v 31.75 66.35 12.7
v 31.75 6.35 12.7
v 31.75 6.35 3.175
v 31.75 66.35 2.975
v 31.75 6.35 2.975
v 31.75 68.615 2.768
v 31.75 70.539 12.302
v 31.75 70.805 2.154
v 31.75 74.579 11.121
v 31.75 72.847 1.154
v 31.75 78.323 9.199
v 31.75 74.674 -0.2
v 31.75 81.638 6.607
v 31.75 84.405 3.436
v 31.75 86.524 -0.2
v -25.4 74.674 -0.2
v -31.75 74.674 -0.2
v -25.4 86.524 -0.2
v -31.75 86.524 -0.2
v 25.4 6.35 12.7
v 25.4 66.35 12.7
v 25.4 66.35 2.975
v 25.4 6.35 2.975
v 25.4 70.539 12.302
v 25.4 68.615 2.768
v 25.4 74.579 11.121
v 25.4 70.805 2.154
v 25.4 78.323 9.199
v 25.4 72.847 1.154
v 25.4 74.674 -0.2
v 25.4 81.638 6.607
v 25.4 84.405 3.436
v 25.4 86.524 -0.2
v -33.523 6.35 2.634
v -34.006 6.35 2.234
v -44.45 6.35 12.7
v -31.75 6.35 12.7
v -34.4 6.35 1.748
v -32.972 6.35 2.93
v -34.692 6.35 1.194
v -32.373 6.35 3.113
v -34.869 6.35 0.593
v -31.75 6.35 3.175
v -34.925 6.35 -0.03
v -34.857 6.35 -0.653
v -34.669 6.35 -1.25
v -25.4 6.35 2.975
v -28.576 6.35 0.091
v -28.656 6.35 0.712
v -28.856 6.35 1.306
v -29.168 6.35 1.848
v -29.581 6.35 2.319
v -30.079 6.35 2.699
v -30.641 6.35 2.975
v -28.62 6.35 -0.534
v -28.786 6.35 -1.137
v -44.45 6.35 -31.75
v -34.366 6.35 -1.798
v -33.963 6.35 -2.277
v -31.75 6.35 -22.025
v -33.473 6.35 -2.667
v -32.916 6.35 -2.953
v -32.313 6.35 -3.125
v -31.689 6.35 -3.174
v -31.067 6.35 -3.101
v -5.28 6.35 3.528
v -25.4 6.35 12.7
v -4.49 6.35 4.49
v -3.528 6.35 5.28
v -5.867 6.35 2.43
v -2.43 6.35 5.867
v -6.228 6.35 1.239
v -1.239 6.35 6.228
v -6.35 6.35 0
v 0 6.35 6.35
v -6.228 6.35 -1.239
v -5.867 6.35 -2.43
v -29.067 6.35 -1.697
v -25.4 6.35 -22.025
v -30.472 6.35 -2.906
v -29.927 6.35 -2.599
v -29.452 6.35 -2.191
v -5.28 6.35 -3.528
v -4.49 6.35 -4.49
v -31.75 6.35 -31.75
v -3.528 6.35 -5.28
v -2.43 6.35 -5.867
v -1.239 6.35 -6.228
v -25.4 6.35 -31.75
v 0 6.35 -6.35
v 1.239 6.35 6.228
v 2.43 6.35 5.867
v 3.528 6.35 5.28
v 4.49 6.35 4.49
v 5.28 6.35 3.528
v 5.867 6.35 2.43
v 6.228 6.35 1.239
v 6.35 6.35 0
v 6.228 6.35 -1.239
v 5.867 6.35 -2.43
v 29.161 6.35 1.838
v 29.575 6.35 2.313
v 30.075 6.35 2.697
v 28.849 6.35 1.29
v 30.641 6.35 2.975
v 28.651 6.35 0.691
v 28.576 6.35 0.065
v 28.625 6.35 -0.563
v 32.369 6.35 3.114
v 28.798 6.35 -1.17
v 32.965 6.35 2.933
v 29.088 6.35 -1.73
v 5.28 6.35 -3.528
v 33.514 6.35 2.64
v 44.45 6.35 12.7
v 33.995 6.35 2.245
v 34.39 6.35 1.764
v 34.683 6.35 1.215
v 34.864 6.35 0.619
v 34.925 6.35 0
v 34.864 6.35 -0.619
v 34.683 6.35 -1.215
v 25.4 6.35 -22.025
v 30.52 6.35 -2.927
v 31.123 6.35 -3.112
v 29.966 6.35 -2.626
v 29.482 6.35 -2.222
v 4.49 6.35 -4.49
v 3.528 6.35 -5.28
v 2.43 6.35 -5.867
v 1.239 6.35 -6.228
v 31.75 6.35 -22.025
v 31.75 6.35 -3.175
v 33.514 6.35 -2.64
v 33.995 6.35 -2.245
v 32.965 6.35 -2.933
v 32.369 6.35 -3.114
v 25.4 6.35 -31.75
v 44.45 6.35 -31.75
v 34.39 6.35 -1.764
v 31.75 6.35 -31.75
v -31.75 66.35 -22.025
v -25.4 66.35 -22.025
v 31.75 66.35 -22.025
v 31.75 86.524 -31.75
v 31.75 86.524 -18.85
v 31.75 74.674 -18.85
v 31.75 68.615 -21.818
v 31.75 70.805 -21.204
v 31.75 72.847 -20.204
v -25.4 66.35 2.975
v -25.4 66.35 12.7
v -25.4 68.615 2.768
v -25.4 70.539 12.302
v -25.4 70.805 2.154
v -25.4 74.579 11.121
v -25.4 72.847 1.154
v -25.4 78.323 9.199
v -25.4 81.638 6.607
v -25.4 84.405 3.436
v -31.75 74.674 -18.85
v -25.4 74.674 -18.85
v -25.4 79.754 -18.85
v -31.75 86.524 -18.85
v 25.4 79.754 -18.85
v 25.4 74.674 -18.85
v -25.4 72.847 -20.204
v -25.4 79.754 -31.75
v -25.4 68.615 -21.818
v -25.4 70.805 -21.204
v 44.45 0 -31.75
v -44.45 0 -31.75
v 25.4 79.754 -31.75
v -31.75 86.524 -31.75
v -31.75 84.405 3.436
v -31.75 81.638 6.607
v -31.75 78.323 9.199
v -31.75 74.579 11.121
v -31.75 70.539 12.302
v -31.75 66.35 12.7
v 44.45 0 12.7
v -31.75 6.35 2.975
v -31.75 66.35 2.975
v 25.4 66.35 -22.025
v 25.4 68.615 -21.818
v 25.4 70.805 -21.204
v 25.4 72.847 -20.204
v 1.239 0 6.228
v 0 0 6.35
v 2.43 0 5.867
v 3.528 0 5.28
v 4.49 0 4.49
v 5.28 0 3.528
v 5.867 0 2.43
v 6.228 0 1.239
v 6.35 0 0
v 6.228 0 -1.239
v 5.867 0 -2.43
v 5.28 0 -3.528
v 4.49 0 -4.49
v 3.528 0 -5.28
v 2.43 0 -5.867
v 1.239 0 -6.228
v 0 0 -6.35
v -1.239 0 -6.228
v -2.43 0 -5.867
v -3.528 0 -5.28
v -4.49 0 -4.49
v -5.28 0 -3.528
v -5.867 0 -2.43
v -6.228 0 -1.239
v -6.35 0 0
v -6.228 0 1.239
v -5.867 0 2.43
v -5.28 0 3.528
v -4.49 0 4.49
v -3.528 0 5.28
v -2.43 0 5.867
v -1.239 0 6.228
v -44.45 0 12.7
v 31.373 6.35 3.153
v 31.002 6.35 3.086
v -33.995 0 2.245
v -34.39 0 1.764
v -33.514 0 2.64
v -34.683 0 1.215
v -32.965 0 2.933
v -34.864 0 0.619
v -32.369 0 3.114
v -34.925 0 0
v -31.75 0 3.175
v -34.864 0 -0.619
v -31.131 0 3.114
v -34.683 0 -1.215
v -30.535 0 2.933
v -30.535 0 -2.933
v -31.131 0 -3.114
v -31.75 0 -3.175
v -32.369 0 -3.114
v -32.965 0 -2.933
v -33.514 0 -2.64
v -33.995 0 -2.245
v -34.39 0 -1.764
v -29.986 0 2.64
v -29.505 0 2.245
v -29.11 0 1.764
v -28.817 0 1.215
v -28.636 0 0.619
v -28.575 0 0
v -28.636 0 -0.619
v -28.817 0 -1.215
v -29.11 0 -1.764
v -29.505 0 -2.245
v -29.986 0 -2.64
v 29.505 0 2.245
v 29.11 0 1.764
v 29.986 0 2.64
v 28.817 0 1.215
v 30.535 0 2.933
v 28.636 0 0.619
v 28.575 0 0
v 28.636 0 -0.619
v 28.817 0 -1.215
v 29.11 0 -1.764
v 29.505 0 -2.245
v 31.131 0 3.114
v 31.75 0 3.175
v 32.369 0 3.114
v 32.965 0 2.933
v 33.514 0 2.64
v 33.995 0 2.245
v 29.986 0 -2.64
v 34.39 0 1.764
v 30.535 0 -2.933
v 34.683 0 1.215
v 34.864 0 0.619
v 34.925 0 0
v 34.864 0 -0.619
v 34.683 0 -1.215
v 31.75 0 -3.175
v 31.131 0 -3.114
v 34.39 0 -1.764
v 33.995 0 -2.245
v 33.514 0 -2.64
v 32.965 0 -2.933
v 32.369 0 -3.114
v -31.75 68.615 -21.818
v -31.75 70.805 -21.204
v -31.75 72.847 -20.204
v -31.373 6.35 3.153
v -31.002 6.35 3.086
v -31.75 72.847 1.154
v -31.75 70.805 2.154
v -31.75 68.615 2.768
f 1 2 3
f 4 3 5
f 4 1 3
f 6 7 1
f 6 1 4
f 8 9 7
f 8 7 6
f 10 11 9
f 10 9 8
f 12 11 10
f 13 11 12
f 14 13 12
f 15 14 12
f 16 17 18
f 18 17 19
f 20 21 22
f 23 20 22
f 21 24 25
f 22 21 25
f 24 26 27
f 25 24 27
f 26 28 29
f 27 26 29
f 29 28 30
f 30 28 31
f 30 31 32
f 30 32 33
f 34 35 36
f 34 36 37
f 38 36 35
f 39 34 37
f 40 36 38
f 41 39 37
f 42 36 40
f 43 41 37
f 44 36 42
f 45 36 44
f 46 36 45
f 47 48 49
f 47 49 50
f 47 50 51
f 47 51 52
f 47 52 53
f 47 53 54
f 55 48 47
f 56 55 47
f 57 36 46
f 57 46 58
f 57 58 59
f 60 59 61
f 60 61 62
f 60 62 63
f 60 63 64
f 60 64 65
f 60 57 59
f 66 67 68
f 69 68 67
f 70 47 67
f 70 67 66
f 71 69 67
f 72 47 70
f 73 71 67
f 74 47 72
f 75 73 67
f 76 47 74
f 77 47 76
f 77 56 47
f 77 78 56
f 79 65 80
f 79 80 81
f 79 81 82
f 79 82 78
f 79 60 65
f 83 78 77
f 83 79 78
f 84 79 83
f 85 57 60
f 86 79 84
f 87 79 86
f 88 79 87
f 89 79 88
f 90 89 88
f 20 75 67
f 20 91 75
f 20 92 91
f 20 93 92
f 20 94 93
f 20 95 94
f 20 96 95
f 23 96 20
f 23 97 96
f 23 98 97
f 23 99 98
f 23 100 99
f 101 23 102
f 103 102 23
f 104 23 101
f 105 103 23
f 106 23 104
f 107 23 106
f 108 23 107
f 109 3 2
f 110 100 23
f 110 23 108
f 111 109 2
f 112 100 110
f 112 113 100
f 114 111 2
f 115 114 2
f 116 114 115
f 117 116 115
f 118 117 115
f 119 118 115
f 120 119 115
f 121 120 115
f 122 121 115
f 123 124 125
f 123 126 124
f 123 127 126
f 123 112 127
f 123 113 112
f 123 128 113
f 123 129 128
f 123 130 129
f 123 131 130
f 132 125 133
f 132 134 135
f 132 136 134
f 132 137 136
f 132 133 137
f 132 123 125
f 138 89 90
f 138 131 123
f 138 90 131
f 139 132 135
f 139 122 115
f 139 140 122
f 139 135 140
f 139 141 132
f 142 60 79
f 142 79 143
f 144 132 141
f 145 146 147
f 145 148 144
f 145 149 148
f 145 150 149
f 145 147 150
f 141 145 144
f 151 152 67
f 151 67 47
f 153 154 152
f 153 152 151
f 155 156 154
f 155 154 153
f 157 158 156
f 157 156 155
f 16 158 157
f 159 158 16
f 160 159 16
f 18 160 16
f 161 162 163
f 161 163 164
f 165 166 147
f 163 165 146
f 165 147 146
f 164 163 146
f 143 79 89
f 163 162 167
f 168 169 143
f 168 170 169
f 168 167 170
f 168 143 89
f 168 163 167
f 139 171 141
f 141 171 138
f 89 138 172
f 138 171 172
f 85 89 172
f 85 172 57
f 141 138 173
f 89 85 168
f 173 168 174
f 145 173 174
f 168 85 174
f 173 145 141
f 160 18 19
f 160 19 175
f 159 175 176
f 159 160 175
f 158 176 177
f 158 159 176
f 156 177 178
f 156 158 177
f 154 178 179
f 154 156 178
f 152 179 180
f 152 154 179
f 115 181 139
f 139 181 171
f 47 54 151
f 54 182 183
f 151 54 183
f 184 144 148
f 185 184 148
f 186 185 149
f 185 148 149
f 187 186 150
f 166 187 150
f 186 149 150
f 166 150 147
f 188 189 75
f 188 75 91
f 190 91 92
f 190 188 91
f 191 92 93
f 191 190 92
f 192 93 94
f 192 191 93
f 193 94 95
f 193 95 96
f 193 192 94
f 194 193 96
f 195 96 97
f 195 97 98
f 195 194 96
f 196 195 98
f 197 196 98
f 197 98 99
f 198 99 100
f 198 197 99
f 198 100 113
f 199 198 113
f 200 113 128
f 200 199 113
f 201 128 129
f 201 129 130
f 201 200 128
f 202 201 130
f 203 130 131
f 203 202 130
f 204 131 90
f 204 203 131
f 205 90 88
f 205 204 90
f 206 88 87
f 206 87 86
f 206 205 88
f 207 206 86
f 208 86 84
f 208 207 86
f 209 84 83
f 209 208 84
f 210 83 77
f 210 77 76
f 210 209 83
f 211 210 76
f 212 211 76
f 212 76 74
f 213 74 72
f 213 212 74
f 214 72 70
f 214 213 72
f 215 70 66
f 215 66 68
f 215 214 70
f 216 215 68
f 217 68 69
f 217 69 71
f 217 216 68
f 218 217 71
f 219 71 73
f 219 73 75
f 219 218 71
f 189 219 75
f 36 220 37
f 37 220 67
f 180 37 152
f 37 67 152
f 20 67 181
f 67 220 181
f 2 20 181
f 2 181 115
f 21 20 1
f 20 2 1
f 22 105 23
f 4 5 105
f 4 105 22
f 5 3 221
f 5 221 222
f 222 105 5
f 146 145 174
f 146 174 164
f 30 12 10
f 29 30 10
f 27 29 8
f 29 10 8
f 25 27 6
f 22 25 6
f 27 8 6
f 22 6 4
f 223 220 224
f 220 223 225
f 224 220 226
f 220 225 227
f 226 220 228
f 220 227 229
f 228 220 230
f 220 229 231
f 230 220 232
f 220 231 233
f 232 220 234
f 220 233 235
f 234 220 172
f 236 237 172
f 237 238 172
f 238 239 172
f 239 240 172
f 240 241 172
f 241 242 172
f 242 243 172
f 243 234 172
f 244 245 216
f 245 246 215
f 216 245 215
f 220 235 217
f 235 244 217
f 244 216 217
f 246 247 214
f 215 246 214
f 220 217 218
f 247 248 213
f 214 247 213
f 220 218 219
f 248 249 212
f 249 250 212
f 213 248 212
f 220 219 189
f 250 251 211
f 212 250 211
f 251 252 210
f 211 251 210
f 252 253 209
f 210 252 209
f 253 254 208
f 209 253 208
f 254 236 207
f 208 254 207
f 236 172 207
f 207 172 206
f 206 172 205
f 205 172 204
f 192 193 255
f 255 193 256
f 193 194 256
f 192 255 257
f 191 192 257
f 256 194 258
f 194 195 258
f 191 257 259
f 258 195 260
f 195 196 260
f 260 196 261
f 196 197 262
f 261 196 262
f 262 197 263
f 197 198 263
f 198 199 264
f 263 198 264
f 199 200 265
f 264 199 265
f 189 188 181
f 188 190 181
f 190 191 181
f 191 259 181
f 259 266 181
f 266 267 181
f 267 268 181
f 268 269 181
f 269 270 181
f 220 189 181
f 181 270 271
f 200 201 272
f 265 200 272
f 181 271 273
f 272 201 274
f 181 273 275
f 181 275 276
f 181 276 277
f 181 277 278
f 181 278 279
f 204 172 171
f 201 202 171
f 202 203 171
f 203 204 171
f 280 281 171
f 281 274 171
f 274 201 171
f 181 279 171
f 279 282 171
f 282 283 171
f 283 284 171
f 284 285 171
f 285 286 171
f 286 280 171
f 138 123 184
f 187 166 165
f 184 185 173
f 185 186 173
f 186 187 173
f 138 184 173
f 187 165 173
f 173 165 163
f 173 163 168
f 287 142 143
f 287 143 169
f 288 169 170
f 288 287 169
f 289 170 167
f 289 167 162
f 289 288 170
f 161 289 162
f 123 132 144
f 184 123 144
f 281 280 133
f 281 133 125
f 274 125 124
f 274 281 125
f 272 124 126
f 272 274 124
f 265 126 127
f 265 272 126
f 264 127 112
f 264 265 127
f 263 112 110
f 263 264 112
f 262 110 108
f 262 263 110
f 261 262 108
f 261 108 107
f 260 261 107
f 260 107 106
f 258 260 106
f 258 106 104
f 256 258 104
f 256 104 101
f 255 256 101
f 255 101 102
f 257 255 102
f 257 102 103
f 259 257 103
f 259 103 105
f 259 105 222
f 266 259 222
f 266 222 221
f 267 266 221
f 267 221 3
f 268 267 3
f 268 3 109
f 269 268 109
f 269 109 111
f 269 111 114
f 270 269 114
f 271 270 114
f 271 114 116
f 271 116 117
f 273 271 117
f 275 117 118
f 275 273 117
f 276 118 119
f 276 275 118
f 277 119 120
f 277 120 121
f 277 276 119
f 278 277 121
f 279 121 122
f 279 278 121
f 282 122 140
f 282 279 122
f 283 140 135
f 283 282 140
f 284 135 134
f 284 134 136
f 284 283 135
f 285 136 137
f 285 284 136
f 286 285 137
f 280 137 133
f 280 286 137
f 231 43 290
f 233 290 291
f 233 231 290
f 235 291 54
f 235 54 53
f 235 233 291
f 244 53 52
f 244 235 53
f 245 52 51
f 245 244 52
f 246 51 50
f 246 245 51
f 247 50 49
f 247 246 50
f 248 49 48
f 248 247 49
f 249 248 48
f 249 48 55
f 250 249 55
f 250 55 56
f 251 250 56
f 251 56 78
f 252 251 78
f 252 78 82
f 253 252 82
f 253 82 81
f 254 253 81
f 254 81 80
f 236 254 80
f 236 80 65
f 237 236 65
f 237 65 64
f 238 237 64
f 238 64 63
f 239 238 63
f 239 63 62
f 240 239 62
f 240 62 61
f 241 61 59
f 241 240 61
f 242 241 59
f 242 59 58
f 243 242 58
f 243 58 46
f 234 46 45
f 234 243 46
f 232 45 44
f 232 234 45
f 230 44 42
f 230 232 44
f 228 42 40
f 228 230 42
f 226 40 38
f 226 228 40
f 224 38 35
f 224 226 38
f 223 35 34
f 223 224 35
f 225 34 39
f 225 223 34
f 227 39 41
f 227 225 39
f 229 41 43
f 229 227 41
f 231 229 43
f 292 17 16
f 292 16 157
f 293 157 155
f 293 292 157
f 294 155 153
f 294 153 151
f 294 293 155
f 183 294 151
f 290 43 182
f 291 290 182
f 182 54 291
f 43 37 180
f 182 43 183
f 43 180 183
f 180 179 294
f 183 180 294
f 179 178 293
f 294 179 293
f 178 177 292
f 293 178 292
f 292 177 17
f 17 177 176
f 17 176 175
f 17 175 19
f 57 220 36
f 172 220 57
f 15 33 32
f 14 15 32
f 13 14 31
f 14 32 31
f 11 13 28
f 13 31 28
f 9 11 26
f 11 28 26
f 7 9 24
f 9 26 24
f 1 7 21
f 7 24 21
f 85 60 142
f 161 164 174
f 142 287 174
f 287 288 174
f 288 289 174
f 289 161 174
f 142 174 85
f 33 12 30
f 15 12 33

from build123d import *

# Parameters (mm, degrees)
SKETCH2_W           = 88.9
SKETCH2_H           = 44.45
SKETCH2_R           = 6.35
SKETCH2_R_2         = 3.175
BOSS_EXTRUDE1_DEPTH = 6.35
SKETCH3_R           = 22.225
SKETCH3_W           = 44.45
SKETCH3_H           = 60
BOSS_EXTRUDE2_DEPTH = 6.35
CUT_EXTRUDE1_REACH  = 123.079
SKETCH4_R           = 12.5
SKETCH4_W           = 25
SKETCH4_H           = 60
SKETCH4_W_2         = 18.65
SKETCH4_H_2         = 13.900675703
SKETCH5_W           = 9.725
SKETCH5_H           = 8.324324297
BOSS_EXTRUDE3_DEPTH = 6.35
SKETCH6_W           = 12.9
SKETCH6_H           = 6.769792784
BOSS_EXTRUDE4_DEPTH = 57.15


with BuildPart() as part:
    # Sketch2 → Boss-Extrude1 (new body)
    with BuildSketch(Plane(origin=(0, 0, 0), x_dir=(1, 0, 0), z_dir=(0, 1, 0))):
        with Locations((0, 9.525)):
            Rectangle(SKETCH2_W, SKETCH2_H)
        with Locations(Location((0, 0, 0), (0, 0, 270))):
            Circle(SKETCH2_R, mode=Mode.SUBTRACT)
        with Locations(Location((-31.75, 0, 0), (0, 0, 270))):
            Circle(SKETCH2_R_2, mode=Mode.SUBTRACT)
        with Locations(Location((31.75, 0, 0), (0, 0, 90))):
            Circle(SKETCH2_R_2, mode=Mode.SUBTRACT)
    extrude(amount=BOSS_EXTRUDE1_DEPTH)

    # Sketch3 → Boss-Extrude2 (add)
    with BuildSketch(Plane(origin=(25.4, 0, 0), x_dir=(0, 0, -1), z_dir=(1, 0, 0))):
        with Locations((9.525, 66.35)):
            Circle(SKETCH3_R)
        with Locations((9.525, 36.35)):
            Rectangle(SKETCH3_W, SKETCH3_H)
    boss_extrude2 = extrude(amount=BOSS_EXTRUDE2_DEPTH)

    # Cut-Extrude1: up to this face of the body (flat: up to its plane)
    cut_extrude1_end = Plane(part.part.faces().sort_by_distance((25.4, 45.236582144, -9.525))[0])
    # Sketch4 → Cut-Extrude1 (cut, up to the picked face)
    with BuildSketch(Plane(origin=(31.75, 0, 0), x_dir=(0, 0, -1), z_dir=(1, 0, 0)), mode=Mode.PRIVATE) as cut_extrude1_sk1:
        with Locations((9.525, 66.35)):
            Circle(SKETCH4_R)
    cut_extrude1_tool1 = split(extrude(cut_extrude1_sk1.sketch, amount=-CUT_EXTRUDE1_REACH, mode=Mode.PRIVATE), bisect_by=cut_extrude1_end, keep=Keep.BOTH, mode=Mode.PRIVATE)
    # Sketch4 → Cut-Extrude1 (cut, up to the picked face)
    with BuildSketch(Plane(origin=(31.75, 0, 0), x_dir=(0, 0, -1), z_dir=(1, 0, 0)), mode=Mode.PRIVATE) as cut_extrude1_sk2:
        with Locations((9.525, 36.35)):
            Rectangle(SKETCH4_W, SKETCH4_H)
    cut_extrude1_tool2 = split(extrude(cut_extrude1_sk2.sketch, amount=-CUT_EXTRUDE1_REACH, mode=Mode.PRIVATE), bisect_by=cut_extrude1_end, keep=Keep.BOTH, mode=Mode.PRIVATE)
    # Sketch4 → Cut-Extrude1 (cut, up to the picked face)
    with BuildSketch(Plane(origin=(31.75, 0, 0), x_dir=(0, 0, -1), z_dir=(1, 0, 0)), mode=Mode.PRIVATE) as cut_extrude1_sk3:
        with Locations((9.525, 81.624662148)):
            Rectangle(SKETCH4_W_2, SKETCH4_H_2)
    cut_extrude1_tool3 = split(extrude(cut_extrude1_sk3.sketch, amount=-CUT_EXTRUDE1_REACH, mode=Mode.PRIVATE), bisect_by=cut_extrude1_end, keep=Keep.BOTH, mode=Mode.PRIVATE)
    cut_extrude1_1 = cut_extrude1_tool1.solids().sort_by(Axis((31.75, 66.35, -9.525), (-1, 0, 0)))[0]
    add(cut_extrude1_1, mode=Mode.SUBTRACT)
    cut_extrude1_2 = cut_extrude1_tool2.solids().sort_by(Axis((31.75, 36.35, -9.525), (-1, 0, 0)))[0]
    add(cut_extrude1_2, mode=Mode.SUBTRACT)
    cut_extrude1_3 = cut_extrude1_tool3.solids().sort_by(Axis((31.75, 81.624662, -9.525), (-1, 0, 0)))[0]
    add(cut_extrude1_3, mode=Mode.SUBTRACT)
    cut_extrude1 = cut_extrude1_1 + cut_extrude1_2 + cut_extrude1_3  # Cut-Extrude1 as one shape, for the pattern or mirror that repeats it

    # Sketch5 → Boss-Extrude3 (add)
    with BuildSketch(Plane(origin=(31.75, 0, 0), x_dir=(0, 0, -1), z_dir=(1, 0, 0))):
        Polygon((31.75, 86.524117081), (18.85, 86.524117081), (18.85, 74.674324297), (22.025, 74.674324297), (31.75, 74.674324297), align=None)
        with Locations((26.8875, 70.512162149)):
            Rectangle(SKETCH5_W, SKETCH5_H)
    boss_extrude3 = extrude(amount=-BOSS_EXTRUDE3_DEPTH)

    # Mirror1: Boss-Extrude2, Cut-Extrude1, Boss-Extrude3 across plane
    add(boss_extrude2.mirror(Plane(origin=(0, 0, 0), x_dir=(0, 0, 1), z_dir=(1, 0, 0))))
    add(cut_extrude1.mirror(Plane(origin=(0, 0, 0), x_dir=(0, 0, 1), z_dir=(1, 0, 0))), mode=Mode.SUBTRACT)
    add(boss_extrude3.mirror(Plane(origin=(0, 0, 0), x_dir=(0, 0, 1), z_dir=(1, 0, 0))))

    # Sketch6 → Boss-Extrude4 (add)
    with BuildSketch(Plane(origin=(31.75, 0, 0), x_dir=(0, 0, -1), z_dir=(1, 0, 0))):
        with Locations((25.3, 83.139220689)):
            Rectangle(SKETCH6_W, SKETCH6_H)
    extrude(amount=-BOSS_EXTRUDE4_DEPTH)


solid = part.part
